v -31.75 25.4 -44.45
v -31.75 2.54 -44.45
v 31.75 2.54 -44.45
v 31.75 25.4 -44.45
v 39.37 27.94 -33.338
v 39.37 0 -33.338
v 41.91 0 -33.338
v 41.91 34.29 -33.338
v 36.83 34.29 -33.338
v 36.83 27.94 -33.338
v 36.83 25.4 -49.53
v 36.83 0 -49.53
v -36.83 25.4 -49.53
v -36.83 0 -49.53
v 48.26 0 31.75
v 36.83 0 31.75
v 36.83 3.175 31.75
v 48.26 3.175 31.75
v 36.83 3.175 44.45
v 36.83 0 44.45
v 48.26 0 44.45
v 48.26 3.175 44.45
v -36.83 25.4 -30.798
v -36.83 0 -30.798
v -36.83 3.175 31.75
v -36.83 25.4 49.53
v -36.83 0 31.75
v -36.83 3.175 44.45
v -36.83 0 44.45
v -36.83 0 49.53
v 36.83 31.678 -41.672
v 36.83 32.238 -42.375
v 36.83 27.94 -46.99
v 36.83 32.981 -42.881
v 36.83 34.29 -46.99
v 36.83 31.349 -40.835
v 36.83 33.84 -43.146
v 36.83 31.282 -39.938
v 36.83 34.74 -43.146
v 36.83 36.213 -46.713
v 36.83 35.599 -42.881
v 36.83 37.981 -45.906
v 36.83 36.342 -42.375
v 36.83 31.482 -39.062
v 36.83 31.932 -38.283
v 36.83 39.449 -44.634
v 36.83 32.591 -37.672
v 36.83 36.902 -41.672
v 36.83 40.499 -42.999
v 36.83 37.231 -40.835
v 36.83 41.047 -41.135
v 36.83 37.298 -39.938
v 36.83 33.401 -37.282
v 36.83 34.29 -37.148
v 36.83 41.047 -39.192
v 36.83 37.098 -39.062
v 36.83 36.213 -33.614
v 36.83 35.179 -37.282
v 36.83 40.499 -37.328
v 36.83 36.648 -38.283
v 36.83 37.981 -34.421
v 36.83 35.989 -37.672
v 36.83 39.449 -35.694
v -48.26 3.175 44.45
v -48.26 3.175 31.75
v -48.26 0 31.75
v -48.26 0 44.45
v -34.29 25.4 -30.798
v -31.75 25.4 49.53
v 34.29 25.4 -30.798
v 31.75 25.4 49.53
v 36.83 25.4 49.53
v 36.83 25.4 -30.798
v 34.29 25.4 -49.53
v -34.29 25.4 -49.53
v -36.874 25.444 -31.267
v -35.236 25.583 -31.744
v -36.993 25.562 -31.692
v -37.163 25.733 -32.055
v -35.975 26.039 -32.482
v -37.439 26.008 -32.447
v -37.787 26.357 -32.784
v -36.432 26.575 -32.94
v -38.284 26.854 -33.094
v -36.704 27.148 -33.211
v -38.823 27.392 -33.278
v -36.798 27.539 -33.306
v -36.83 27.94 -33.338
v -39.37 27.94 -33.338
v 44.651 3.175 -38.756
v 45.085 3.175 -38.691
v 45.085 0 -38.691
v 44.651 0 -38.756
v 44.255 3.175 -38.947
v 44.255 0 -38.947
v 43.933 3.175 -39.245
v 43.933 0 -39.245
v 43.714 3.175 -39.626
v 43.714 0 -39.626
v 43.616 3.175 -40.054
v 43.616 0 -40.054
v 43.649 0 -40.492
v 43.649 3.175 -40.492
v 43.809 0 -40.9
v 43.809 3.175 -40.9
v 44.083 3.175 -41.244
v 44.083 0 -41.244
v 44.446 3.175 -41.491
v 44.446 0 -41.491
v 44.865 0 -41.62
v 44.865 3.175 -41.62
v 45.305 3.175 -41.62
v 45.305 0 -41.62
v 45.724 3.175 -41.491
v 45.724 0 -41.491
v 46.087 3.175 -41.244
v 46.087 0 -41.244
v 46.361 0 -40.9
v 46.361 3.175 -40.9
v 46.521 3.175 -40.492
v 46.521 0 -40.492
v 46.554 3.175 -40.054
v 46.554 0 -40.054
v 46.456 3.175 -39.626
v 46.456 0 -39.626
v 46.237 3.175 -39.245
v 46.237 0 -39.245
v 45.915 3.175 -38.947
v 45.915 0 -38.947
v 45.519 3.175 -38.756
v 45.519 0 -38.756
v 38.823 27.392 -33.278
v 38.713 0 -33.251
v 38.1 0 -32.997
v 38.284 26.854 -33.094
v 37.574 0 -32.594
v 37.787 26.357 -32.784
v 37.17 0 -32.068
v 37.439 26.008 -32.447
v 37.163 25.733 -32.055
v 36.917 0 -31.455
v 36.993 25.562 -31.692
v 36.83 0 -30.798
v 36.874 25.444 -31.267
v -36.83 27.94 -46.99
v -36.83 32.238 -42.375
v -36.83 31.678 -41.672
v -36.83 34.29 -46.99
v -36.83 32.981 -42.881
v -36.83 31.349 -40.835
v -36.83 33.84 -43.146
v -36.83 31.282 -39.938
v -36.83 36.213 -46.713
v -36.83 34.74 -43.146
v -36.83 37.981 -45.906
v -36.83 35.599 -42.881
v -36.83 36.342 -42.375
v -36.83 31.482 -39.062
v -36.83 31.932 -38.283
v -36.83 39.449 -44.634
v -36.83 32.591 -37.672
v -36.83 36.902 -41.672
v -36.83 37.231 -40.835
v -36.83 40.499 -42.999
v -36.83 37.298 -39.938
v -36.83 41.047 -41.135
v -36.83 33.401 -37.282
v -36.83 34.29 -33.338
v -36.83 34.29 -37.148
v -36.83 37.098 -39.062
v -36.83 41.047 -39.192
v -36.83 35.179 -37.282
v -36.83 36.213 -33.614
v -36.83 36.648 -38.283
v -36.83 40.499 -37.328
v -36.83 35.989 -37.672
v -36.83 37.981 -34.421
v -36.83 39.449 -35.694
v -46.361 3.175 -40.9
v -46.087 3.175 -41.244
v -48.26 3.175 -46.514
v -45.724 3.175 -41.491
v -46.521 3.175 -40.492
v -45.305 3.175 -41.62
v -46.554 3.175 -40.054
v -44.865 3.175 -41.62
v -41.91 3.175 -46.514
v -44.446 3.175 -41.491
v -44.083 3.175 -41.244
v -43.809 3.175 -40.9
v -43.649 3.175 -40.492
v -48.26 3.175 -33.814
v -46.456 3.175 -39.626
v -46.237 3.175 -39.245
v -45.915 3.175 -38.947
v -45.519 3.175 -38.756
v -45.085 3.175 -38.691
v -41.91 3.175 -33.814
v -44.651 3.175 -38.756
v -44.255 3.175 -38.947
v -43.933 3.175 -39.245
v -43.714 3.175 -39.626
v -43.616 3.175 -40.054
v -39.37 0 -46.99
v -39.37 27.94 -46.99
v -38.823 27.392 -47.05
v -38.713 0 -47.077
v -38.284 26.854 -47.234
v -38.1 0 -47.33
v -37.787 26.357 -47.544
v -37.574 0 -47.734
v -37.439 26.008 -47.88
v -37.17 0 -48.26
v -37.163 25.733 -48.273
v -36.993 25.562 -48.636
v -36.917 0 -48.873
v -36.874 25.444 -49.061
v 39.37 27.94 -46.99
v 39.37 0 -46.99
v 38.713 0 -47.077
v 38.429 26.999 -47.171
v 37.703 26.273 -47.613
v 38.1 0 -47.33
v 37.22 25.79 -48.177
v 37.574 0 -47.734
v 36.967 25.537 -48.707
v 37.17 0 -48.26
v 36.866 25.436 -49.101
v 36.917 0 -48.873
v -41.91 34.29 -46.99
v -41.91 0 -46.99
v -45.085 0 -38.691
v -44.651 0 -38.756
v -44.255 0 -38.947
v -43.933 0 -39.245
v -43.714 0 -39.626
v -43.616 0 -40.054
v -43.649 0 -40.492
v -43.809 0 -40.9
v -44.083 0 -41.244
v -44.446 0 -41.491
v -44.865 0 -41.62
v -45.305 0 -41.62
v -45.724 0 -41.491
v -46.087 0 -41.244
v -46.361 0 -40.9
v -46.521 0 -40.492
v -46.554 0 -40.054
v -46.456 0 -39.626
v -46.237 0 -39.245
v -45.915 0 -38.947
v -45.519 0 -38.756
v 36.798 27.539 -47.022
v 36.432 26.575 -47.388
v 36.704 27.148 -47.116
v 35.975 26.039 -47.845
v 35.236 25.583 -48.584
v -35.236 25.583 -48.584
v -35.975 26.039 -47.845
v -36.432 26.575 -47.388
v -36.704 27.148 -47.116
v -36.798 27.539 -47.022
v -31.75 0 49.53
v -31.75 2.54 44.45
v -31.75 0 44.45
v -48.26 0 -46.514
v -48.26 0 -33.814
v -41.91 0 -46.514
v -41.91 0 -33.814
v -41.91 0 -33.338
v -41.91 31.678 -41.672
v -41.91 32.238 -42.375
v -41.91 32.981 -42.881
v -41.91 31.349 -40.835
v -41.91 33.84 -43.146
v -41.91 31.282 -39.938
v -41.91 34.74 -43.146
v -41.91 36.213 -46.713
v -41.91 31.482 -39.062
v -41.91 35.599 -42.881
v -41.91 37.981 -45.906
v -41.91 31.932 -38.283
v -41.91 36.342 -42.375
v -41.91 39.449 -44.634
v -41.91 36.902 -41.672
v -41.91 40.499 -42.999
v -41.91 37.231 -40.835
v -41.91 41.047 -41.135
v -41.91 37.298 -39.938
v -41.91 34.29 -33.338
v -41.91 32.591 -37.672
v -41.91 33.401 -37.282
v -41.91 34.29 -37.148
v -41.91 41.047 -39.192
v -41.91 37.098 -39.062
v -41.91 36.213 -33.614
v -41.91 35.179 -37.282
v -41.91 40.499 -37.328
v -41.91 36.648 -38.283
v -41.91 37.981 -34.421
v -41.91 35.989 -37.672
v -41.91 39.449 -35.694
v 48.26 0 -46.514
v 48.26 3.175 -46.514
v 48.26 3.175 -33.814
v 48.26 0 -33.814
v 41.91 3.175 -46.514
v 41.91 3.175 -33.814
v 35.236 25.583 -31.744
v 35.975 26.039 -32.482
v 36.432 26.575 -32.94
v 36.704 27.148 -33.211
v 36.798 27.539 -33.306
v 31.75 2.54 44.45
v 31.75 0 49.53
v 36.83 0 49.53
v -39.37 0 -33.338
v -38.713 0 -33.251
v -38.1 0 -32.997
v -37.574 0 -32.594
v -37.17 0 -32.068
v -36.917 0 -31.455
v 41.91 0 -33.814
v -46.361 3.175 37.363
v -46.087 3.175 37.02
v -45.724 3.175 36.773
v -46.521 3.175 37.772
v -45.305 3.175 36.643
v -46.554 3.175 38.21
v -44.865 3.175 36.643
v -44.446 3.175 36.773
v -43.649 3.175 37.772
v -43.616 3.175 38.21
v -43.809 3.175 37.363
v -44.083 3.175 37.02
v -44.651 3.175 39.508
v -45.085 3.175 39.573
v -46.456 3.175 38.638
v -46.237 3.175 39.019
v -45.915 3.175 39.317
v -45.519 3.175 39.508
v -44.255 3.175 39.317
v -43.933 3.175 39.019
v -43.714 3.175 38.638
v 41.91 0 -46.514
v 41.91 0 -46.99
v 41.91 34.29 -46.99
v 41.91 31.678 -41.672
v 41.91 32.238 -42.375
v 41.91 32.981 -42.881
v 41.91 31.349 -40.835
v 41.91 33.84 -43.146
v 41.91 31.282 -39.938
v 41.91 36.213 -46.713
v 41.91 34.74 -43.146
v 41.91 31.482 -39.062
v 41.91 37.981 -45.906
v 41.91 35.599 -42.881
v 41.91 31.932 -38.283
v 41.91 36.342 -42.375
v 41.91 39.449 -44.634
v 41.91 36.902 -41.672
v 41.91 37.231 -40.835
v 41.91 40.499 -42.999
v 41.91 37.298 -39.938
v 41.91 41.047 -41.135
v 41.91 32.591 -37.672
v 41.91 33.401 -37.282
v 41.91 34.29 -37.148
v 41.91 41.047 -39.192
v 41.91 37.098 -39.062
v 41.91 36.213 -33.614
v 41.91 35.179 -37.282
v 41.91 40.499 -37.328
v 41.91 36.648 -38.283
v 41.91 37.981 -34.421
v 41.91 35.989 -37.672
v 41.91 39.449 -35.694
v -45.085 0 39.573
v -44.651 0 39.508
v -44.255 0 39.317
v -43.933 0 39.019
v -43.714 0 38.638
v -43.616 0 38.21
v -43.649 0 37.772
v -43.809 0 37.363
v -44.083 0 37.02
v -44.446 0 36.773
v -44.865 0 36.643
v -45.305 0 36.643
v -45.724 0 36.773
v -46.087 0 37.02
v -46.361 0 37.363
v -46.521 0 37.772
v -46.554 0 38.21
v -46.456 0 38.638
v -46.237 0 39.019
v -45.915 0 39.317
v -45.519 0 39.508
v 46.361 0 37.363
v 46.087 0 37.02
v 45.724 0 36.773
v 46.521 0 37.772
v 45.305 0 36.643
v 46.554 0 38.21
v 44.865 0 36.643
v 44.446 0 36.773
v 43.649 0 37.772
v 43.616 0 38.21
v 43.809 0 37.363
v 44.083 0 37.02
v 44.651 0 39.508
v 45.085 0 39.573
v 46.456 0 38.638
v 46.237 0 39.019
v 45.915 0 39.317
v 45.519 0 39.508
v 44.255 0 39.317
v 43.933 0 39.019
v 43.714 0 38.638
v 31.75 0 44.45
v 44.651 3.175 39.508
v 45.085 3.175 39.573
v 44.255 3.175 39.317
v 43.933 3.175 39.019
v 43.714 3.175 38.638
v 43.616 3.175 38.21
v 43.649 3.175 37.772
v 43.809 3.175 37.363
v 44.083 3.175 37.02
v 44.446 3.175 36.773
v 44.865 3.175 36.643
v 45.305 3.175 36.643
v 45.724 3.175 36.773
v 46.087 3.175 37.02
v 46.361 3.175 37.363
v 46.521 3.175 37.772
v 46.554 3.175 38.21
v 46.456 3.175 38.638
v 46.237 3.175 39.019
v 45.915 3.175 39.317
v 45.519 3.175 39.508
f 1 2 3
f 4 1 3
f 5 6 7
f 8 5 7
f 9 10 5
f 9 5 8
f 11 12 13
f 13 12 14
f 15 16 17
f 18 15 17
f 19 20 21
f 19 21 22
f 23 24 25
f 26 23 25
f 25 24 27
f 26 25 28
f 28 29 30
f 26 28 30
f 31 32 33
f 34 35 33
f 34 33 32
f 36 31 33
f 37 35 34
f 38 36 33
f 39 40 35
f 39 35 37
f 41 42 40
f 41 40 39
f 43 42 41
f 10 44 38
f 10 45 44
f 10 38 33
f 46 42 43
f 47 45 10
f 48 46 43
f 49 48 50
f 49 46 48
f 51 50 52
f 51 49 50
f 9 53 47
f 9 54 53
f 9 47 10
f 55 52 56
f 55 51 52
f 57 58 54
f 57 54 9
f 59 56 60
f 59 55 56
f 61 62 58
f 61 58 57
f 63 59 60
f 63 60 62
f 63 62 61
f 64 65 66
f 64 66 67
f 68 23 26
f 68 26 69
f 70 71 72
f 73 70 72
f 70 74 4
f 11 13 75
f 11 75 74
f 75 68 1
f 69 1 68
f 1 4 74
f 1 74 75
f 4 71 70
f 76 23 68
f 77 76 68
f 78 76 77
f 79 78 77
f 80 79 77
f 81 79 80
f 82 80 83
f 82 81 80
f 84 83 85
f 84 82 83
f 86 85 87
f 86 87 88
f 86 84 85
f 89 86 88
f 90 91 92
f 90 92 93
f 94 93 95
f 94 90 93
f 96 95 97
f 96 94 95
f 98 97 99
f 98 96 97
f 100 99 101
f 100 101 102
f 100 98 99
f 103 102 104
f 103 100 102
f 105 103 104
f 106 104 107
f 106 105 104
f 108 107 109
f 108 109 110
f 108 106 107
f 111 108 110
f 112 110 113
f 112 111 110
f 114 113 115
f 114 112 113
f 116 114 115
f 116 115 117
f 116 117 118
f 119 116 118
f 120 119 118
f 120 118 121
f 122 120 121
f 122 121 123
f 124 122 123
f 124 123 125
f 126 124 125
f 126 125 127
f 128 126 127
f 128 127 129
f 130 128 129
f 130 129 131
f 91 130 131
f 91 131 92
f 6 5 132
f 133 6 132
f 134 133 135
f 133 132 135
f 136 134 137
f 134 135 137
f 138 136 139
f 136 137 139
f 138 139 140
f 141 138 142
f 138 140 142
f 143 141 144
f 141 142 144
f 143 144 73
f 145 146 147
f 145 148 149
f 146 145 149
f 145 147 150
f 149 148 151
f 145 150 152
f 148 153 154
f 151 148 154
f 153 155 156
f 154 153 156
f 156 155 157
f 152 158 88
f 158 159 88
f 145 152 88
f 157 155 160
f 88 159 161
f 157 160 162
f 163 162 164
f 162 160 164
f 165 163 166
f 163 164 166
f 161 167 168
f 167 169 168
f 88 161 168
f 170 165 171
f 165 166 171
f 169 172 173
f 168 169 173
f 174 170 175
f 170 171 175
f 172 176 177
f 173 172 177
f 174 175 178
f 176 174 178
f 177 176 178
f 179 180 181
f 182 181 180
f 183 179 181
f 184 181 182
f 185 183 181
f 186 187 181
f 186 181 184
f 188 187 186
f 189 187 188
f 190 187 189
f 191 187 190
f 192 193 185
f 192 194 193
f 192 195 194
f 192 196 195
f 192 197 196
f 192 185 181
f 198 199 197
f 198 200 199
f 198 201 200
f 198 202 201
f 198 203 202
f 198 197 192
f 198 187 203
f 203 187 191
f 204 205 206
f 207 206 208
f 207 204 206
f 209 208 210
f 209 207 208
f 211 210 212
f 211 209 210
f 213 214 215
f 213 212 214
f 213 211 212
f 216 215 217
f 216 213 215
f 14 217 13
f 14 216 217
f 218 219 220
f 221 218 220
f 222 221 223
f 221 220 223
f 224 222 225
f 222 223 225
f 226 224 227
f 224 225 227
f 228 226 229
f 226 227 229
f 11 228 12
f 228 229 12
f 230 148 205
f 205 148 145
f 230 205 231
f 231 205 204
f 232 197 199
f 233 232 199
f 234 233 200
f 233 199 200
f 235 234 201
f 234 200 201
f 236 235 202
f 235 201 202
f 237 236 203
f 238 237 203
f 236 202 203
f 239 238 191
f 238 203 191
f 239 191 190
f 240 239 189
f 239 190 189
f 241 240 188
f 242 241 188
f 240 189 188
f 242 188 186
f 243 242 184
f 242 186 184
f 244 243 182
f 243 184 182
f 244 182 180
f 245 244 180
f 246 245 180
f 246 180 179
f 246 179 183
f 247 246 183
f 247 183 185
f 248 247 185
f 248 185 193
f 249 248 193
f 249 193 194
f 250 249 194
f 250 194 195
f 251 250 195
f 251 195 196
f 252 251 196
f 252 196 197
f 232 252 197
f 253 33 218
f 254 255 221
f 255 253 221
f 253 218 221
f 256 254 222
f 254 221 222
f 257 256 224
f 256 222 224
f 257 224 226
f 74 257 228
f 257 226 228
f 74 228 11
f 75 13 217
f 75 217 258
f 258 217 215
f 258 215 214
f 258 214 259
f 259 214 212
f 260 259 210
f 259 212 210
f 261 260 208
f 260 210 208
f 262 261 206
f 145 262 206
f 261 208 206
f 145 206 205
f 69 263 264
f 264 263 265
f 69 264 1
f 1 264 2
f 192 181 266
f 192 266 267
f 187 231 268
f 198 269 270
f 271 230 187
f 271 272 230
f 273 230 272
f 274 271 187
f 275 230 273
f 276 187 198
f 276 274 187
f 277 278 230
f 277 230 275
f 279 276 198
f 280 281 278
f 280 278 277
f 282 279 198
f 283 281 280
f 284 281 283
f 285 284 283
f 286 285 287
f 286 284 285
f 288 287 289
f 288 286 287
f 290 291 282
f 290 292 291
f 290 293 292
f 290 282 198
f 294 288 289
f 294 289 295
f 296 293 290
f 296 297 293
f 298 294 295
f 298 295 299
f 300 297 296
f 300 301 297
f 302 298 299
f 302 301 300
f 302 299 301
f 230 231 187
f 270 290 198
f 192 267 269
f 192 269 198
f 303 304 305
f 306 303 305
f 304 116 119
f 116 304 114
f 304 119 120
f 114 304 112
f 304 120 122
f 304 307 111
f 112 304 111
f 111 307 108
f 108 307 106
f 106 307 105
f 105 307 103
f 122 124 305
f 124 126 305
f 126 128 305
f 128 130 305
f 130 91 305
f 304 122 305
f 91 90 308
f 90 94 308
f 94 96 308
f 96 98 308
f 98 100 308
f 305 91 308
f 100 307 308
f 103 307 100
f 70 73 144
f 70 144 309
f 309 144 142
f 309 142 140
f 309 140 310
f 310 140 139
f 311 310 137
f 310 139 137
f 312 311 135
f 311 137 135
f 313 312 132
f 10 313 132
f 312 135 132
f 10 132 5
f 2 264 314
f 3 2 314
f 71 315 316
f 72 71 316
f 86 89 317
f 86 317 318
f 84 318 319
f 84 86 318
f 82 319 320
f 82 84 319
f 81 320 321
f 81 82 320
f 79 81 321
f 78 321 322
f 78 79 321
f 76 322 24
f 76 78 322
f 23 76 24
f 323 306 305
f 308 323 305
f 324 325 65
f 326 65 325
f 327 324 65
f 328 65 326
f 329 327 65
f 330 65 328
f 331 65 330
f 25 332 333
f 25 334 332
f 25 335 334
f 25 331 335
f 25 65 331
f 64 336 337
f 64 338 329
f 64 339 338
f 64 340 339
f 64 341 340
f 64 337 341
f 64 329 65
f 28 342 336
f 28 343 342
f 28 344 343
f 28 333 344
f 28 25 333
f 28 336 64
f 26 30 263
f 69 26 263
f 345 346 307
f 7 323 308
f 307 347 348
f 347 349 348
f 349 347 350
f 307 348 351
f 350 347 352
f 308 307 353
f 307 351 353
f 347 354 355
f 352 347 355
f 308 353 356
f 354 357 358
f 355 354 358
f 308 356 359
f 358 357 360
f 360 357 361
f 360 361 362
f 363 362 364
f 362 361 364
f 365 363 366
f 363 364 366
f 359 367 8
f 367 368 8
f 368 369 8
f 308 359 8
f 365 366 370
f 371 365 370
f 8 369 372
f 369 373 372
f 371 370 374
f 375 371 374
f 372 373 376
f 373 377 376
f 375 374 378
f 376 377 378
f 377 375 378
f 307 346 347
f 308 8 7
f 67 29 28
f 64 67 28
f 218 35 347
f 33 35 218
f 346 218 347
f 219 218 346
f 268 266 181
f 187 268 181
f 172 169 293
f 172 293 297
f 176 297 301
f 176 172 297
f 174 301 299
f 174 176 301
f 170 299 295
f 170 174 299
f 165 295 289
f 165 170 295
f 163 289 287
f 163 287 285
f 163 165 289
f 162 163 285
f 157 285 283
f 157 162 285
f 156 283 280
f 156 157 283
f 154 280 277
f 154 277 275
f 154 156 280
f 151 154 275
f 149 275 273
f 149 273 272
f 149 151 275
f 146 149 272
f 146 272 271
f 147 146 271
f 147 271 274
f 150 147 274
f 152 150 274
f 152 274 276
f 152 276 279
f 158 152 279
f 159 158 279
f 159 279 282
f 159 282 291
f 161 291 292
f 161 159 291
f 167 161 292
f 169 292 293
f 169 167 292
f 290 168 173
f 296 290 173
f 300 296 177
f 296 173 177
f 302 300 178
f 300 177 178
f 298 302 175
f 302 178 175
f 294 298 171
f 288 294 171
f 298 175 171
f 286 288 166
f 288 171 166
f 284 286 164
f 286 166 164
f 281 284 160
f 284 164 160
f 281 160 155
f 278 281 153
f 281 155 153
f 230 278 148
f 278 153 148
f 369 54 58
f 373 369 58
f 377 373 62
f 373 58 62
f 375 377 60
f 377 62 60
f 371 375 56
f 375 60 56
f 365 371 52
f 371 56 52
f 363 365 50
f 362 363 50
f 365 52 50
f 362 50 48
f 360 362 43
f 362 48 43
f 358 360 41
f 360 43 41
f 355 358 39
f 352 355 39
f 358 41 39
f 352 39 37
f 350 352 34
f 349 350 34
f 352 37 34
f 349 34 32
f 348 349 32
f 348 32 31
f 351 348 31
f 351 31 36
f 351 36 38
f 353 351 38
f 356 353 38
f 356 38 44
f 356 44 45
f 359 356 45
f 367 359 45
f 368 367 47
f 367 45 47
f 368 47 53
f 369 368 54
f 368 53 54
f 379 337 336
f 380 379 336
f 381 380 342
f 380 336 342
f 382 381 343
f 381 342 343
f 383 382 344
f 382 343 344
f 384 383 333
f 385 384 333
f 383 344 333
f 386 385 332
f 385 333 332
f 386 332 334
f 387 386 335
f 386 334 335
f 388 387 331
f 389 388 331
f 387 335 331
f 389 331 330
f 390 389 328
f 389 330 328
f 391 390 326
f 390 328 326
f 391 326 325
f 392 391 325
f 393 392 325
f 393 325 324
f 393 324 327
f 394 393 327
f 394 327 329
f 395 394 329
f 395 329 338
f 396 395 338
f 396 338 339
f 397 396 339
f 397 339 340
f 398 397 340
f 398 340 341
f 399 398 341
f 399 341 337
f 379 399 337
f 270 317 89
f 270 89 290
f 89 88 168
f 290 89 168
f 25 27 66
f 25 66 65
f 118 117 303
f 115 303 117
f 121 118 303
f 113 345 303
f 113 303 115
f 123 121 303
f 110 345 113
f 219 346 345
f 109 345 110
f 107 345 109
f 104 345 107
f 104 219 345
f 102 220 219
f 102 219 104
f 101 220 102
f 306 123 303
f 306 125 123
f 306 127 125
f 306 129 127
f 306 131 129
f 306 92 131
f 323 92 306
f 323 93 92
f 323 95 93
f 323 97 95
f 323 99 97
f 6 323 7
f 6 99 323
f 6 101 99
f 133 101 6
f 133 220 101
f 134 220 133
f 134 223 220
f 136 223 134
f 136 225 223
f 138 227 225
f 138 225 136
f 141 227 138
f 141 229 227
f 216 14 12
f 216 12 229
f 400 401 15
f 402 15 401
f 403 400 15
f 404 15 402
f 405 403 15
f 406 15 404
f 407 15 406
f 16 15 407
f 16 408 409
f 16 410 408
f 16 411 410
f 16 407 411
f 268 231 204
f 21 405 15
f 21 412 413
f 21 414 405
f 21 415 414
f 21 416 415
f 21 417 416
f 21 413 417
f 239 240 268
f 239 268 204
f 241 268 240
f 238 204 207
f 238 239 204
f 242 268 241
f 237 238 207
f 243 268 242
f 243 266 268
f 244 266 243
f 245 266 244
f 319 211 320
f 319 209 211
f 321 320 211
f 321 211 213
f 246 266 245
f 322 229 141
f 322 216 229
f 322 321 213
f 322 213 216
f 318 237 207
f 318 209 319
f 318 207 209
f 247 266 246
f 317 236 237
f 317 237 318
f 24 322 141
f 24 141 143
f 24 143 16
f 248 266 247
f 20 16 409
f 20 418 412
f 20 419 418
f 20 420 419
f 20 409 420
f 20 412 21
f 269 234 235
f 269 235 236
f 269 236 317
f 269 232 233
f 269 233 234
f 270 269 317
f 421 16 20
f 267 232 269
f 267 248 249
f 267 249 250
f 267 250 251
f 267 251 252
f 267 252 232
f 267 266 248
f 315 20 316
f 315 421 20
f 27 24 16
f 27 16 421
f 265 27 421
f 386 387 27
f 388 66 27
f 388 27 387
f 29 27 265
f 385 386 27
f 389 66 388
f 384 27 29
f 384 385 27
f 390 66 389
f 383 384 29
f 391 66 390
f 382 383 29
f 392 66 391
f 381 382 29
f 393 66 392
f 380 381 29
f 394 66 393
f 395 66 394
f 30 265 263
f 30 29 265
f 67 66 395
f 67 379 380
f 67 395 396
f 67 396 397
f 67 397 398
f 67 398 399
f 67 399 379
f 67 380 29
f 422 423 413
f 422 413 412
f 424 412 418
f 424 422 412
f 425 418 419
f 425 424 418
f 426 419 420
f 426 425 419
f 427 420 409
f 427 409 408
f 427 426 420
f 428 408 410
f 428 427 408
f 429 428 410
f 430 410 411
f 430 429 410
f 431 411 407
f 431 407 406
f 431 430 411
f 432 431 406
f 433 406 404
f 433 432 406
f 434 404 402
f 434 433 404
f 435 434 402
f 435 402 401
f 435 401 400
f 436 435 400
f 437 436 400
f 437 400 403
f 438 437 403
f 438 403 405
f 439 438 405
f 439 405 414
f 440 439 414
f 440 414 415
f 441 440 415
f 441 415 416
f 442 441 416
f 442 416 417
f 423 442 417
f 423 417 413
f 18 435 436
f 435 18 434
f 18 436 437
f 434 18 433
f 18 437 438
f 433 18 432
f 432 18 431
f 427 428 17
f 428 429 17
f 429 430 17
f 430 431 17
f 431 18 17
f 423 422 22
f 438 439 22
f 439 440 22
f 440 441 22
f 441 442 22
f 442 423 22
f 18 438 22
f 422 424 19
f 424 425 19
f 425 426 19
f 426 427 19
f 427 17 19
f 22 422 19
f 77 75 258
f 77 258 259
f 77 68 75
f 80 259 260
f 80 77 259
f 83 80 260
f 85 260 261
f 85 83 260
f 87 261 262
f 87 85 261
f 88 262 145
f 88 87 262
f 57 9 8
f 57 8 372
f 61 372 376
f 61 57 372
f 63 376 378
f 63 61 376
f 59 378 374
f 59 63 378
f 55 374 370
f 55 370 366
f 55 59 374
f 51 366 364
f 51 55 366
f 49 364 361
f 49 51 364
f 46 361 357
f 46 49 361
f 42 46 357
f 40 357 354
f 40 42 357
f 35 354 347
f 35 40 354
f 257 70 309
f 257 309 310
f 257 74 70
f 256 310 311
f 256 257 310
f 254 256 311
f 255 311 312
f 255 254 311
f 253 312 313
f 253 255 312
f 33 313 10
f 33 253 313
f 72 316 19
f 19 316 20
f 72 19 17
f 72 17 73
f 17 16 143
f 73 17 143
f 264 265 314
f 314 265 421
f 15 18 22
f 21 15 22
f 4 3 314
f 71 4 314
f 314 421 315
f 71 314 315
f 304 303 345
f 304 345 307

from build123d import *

# Parameters (mm, degrees)
SKETCH3_W           = 63.5
SKETCH3_H           = 88.9
BOSS_EXTRUDE1_DEPTH = 2.54
BOSS_EXTRUDE2_DEPTH = 25.4
SKETCH5_R           = 3.01625
BOSS_EXTRUDE3_DEPTH = 5.08
FILLET1_R           = 2.54
FILLET2_R           = 2.54
SKETCH6_W           = 12.7
SKETCH6_H           = 3.175
BOSS_EXTRUDE4_DEPTH = 6.35
CUT_EXTRUDE1_REACH  = 80.878
SKETCH7_R           = 1.4732
SKETCH8_W           = 12.7
SKETCH8_H           = 3.175
BOSS_EXTRUDE5_DEPTH = 11.43
CUT_EXTRUDE2_REACH  = 80.878
SKETCH9_R           = 1.4732


with BuildPart() as part:
    # Sketch3 → Boss-Extrude1 (new body)
    with BuildSketch(Plane(origin=(0, 0, 0), x_dir=(1, 0, 0), z_dir=(0, 1, 0))):
        Rectangle(SKETCH3_W, SKETCH3_H)
    extrude(amount=BOSS_EXTRUDE1_DEPTH)

    # Sketch4 → Boss-Extrude2 (add)
    with BuildSketch(Plane(origin=(0, 0, 0), x_dir=(1, 0, 0), z_dir=(0, 1, 0))):
        Polygon((-31.75, -44.45), (-31.75, 44.45), (31.75, 44.45), (31.75, -44.45), (31.75, -49.53), (36.83, -49.53), (36.83, 49.53), (-36.83, 49.53), (-36.83, -49.53), (-31.75, -49.53), align=None)
    extrude(amount=BOSS_EXTRUDE2_DEPTH)

    # Sketch5 → Boss-Extrude3 (add)
    with BuildSketch(Plane.ZY.offset(36.83)):
        with BuildLine():
            Line((-46.99, 34.29), (-46.99, 0))
            Line((-46.99, 0), (-33.3375, 0))
            Line((-33.3375, 0), (-33.3375, 34.29))
            ThreePointArc((-33.3375, 34.29), (-40.16375, 41.11625), (-46.99, 34.29))
        make_face()
        with Locations((-40.16375, 34.29)):
            Circle(SKETCH5_R, mode=Mode.SUBTRACT)
    boss_extrude3 = extrude(amount=BOSS_EXTRUDE3_DEPTH)

    # Mirror1: Boss-Extrude3 across plane
    add(boss_extrude3.mirror(Plane(origin=(0, 0, 0), x_dir=(0, 0, 1), z_dir=(1, 0, 0))))

    # Fillet1
    fillet1_edges = [part.edges().sort_by_distance(p)[0] for p in [
        (-36.83, 12.7, -46.99),
        (-36.83, 12.7, -33.3375),
        (36.83, 12.7, -46.99),
        (36.83, 12.7, -33.3375),
    ]]
    fillet(fillet1_edges, radius=FILLET1_R - 0.0001)  # a hair under: the kernel refuses the full size

    # Fillet2
    fillet2_edges = [part.edges().sort_by_distance(p)[0] for p in [
        (38.09995, 25.4, -33.3375),
        (36.83, 25.4, -40.16375),
        (38.09995, 25.4, -46.99),
        (-38.09995, 25.4, -46.99),
        (-36.83, 25.4, -40.16375),
        (-38.09995, 25.4, -33.3375),
    ]]
    fillet(fillet2_edges, radius=FILLET2_R - 0.0004)  # a hair under: the kernel refuses the full size

    # Sketch6 → Boss-Extrude4 (add)
    with BuildSketch(Plane.ZY.offset(41.91)):
        with Locations((-40.16375, 1.5875)):
            Rectangle(SKETCH6_W, SKETCH6_H)
    boss_extrude4 = extrude(amount=BOSS_EXTRUDE4_DEPTH)

    # Sketch7 → Cut-Extrude1 (cut, up to next)
    with BuildSketch(Plane(origin=(0, 3.175, 0), x_dir=(1, 0, 0), z_dir=(0, 1, 0)), mode=Mode.PRIVATE) as cut_extrude1_sk1:
        with Locations(Location((-45.085, 40.16375, 0), (0, 0, 270))):
            Circle(SKETCH7_R)
    cut_extrude1_tool1 = extrude(cut_extrude1_sk1.sketch, amount=-CUT_EXTRUDE1_REACH, mode=Mode.PRIVATE) & part.part
    cut_extrude1 = cut_extrude1_tool1.solids().sort_by_distance((-45.085, 3.175, -40.16375))[0]
    add(cut_extrude1, mode=Mode.SUBTRACT)

    # Sketch8 → Boss-Extrude5 (add)
    with BuildSketch(Plane.ZY.offset(36.83)):
        with Locations((38.1, 1.5875)):
            Rectangle(SKETCH8_W, SKETCH8_H)
    boss_extrude5 = extrude(amount=BOSS_EXTRUDE5_DEPTH)

    # Sketch9 → Cut-Extrude2 (cut, up to next)
    with BuildSketch(Plane(origin=(0, 3.175, 0), x_dir=(1, 0, 0), z_dir=(0, 1, 0)), mode=Mode.PRIVATE) as cut_extrude2_sk1:
        with Locations(Location((-45.085, -38.1, 0), (0, 0, 270))):
            Circle(SKETCH9_R)
    cut_extrude2_tool1 = extrude(cut_extrude2_sk1.sketch, amount=-CUT_EXTRUDE2_REACH, mode=Mode.PRIVATE) & part.part
    cut_extrude2 = cut_extrude2_tool1.solids().sort_by_distance((-45.085, 3.175, 38.1))[0]
    add(cut_extrude2, mode=Mode.SUBTRACT)

    # Mirror2: Boss-Extrude4, Cut-Extrude1, Boss-Extrude5, Cut-Extrude2 across plane
    add(boss_extrude4.mirror(Plane(origin=(0, 0, 0), x_dir=(0, 0, 1), z_dir=(1, 0, 0))))
    add(cut_extrude1.mirror(Plane(origin=(0, 0, 0), x_dir=(0, 0, 1), z_dir=(1, 0, 0))), mode=Mode.SUBTRACT)
    add(boss_extrude5.mirror(Plane(origin=(0, 0, 0), x_dir=(0, 0, 1), z_dir=(1, 0, 0))))
    add(cut_extrude2.mirror(Plane(origin=(0, 0, 0), x_dir=(0, 0, 1), z_dir=(1, 0, 0))), mode=Mode.SUBTRACT)


solid = part.part
